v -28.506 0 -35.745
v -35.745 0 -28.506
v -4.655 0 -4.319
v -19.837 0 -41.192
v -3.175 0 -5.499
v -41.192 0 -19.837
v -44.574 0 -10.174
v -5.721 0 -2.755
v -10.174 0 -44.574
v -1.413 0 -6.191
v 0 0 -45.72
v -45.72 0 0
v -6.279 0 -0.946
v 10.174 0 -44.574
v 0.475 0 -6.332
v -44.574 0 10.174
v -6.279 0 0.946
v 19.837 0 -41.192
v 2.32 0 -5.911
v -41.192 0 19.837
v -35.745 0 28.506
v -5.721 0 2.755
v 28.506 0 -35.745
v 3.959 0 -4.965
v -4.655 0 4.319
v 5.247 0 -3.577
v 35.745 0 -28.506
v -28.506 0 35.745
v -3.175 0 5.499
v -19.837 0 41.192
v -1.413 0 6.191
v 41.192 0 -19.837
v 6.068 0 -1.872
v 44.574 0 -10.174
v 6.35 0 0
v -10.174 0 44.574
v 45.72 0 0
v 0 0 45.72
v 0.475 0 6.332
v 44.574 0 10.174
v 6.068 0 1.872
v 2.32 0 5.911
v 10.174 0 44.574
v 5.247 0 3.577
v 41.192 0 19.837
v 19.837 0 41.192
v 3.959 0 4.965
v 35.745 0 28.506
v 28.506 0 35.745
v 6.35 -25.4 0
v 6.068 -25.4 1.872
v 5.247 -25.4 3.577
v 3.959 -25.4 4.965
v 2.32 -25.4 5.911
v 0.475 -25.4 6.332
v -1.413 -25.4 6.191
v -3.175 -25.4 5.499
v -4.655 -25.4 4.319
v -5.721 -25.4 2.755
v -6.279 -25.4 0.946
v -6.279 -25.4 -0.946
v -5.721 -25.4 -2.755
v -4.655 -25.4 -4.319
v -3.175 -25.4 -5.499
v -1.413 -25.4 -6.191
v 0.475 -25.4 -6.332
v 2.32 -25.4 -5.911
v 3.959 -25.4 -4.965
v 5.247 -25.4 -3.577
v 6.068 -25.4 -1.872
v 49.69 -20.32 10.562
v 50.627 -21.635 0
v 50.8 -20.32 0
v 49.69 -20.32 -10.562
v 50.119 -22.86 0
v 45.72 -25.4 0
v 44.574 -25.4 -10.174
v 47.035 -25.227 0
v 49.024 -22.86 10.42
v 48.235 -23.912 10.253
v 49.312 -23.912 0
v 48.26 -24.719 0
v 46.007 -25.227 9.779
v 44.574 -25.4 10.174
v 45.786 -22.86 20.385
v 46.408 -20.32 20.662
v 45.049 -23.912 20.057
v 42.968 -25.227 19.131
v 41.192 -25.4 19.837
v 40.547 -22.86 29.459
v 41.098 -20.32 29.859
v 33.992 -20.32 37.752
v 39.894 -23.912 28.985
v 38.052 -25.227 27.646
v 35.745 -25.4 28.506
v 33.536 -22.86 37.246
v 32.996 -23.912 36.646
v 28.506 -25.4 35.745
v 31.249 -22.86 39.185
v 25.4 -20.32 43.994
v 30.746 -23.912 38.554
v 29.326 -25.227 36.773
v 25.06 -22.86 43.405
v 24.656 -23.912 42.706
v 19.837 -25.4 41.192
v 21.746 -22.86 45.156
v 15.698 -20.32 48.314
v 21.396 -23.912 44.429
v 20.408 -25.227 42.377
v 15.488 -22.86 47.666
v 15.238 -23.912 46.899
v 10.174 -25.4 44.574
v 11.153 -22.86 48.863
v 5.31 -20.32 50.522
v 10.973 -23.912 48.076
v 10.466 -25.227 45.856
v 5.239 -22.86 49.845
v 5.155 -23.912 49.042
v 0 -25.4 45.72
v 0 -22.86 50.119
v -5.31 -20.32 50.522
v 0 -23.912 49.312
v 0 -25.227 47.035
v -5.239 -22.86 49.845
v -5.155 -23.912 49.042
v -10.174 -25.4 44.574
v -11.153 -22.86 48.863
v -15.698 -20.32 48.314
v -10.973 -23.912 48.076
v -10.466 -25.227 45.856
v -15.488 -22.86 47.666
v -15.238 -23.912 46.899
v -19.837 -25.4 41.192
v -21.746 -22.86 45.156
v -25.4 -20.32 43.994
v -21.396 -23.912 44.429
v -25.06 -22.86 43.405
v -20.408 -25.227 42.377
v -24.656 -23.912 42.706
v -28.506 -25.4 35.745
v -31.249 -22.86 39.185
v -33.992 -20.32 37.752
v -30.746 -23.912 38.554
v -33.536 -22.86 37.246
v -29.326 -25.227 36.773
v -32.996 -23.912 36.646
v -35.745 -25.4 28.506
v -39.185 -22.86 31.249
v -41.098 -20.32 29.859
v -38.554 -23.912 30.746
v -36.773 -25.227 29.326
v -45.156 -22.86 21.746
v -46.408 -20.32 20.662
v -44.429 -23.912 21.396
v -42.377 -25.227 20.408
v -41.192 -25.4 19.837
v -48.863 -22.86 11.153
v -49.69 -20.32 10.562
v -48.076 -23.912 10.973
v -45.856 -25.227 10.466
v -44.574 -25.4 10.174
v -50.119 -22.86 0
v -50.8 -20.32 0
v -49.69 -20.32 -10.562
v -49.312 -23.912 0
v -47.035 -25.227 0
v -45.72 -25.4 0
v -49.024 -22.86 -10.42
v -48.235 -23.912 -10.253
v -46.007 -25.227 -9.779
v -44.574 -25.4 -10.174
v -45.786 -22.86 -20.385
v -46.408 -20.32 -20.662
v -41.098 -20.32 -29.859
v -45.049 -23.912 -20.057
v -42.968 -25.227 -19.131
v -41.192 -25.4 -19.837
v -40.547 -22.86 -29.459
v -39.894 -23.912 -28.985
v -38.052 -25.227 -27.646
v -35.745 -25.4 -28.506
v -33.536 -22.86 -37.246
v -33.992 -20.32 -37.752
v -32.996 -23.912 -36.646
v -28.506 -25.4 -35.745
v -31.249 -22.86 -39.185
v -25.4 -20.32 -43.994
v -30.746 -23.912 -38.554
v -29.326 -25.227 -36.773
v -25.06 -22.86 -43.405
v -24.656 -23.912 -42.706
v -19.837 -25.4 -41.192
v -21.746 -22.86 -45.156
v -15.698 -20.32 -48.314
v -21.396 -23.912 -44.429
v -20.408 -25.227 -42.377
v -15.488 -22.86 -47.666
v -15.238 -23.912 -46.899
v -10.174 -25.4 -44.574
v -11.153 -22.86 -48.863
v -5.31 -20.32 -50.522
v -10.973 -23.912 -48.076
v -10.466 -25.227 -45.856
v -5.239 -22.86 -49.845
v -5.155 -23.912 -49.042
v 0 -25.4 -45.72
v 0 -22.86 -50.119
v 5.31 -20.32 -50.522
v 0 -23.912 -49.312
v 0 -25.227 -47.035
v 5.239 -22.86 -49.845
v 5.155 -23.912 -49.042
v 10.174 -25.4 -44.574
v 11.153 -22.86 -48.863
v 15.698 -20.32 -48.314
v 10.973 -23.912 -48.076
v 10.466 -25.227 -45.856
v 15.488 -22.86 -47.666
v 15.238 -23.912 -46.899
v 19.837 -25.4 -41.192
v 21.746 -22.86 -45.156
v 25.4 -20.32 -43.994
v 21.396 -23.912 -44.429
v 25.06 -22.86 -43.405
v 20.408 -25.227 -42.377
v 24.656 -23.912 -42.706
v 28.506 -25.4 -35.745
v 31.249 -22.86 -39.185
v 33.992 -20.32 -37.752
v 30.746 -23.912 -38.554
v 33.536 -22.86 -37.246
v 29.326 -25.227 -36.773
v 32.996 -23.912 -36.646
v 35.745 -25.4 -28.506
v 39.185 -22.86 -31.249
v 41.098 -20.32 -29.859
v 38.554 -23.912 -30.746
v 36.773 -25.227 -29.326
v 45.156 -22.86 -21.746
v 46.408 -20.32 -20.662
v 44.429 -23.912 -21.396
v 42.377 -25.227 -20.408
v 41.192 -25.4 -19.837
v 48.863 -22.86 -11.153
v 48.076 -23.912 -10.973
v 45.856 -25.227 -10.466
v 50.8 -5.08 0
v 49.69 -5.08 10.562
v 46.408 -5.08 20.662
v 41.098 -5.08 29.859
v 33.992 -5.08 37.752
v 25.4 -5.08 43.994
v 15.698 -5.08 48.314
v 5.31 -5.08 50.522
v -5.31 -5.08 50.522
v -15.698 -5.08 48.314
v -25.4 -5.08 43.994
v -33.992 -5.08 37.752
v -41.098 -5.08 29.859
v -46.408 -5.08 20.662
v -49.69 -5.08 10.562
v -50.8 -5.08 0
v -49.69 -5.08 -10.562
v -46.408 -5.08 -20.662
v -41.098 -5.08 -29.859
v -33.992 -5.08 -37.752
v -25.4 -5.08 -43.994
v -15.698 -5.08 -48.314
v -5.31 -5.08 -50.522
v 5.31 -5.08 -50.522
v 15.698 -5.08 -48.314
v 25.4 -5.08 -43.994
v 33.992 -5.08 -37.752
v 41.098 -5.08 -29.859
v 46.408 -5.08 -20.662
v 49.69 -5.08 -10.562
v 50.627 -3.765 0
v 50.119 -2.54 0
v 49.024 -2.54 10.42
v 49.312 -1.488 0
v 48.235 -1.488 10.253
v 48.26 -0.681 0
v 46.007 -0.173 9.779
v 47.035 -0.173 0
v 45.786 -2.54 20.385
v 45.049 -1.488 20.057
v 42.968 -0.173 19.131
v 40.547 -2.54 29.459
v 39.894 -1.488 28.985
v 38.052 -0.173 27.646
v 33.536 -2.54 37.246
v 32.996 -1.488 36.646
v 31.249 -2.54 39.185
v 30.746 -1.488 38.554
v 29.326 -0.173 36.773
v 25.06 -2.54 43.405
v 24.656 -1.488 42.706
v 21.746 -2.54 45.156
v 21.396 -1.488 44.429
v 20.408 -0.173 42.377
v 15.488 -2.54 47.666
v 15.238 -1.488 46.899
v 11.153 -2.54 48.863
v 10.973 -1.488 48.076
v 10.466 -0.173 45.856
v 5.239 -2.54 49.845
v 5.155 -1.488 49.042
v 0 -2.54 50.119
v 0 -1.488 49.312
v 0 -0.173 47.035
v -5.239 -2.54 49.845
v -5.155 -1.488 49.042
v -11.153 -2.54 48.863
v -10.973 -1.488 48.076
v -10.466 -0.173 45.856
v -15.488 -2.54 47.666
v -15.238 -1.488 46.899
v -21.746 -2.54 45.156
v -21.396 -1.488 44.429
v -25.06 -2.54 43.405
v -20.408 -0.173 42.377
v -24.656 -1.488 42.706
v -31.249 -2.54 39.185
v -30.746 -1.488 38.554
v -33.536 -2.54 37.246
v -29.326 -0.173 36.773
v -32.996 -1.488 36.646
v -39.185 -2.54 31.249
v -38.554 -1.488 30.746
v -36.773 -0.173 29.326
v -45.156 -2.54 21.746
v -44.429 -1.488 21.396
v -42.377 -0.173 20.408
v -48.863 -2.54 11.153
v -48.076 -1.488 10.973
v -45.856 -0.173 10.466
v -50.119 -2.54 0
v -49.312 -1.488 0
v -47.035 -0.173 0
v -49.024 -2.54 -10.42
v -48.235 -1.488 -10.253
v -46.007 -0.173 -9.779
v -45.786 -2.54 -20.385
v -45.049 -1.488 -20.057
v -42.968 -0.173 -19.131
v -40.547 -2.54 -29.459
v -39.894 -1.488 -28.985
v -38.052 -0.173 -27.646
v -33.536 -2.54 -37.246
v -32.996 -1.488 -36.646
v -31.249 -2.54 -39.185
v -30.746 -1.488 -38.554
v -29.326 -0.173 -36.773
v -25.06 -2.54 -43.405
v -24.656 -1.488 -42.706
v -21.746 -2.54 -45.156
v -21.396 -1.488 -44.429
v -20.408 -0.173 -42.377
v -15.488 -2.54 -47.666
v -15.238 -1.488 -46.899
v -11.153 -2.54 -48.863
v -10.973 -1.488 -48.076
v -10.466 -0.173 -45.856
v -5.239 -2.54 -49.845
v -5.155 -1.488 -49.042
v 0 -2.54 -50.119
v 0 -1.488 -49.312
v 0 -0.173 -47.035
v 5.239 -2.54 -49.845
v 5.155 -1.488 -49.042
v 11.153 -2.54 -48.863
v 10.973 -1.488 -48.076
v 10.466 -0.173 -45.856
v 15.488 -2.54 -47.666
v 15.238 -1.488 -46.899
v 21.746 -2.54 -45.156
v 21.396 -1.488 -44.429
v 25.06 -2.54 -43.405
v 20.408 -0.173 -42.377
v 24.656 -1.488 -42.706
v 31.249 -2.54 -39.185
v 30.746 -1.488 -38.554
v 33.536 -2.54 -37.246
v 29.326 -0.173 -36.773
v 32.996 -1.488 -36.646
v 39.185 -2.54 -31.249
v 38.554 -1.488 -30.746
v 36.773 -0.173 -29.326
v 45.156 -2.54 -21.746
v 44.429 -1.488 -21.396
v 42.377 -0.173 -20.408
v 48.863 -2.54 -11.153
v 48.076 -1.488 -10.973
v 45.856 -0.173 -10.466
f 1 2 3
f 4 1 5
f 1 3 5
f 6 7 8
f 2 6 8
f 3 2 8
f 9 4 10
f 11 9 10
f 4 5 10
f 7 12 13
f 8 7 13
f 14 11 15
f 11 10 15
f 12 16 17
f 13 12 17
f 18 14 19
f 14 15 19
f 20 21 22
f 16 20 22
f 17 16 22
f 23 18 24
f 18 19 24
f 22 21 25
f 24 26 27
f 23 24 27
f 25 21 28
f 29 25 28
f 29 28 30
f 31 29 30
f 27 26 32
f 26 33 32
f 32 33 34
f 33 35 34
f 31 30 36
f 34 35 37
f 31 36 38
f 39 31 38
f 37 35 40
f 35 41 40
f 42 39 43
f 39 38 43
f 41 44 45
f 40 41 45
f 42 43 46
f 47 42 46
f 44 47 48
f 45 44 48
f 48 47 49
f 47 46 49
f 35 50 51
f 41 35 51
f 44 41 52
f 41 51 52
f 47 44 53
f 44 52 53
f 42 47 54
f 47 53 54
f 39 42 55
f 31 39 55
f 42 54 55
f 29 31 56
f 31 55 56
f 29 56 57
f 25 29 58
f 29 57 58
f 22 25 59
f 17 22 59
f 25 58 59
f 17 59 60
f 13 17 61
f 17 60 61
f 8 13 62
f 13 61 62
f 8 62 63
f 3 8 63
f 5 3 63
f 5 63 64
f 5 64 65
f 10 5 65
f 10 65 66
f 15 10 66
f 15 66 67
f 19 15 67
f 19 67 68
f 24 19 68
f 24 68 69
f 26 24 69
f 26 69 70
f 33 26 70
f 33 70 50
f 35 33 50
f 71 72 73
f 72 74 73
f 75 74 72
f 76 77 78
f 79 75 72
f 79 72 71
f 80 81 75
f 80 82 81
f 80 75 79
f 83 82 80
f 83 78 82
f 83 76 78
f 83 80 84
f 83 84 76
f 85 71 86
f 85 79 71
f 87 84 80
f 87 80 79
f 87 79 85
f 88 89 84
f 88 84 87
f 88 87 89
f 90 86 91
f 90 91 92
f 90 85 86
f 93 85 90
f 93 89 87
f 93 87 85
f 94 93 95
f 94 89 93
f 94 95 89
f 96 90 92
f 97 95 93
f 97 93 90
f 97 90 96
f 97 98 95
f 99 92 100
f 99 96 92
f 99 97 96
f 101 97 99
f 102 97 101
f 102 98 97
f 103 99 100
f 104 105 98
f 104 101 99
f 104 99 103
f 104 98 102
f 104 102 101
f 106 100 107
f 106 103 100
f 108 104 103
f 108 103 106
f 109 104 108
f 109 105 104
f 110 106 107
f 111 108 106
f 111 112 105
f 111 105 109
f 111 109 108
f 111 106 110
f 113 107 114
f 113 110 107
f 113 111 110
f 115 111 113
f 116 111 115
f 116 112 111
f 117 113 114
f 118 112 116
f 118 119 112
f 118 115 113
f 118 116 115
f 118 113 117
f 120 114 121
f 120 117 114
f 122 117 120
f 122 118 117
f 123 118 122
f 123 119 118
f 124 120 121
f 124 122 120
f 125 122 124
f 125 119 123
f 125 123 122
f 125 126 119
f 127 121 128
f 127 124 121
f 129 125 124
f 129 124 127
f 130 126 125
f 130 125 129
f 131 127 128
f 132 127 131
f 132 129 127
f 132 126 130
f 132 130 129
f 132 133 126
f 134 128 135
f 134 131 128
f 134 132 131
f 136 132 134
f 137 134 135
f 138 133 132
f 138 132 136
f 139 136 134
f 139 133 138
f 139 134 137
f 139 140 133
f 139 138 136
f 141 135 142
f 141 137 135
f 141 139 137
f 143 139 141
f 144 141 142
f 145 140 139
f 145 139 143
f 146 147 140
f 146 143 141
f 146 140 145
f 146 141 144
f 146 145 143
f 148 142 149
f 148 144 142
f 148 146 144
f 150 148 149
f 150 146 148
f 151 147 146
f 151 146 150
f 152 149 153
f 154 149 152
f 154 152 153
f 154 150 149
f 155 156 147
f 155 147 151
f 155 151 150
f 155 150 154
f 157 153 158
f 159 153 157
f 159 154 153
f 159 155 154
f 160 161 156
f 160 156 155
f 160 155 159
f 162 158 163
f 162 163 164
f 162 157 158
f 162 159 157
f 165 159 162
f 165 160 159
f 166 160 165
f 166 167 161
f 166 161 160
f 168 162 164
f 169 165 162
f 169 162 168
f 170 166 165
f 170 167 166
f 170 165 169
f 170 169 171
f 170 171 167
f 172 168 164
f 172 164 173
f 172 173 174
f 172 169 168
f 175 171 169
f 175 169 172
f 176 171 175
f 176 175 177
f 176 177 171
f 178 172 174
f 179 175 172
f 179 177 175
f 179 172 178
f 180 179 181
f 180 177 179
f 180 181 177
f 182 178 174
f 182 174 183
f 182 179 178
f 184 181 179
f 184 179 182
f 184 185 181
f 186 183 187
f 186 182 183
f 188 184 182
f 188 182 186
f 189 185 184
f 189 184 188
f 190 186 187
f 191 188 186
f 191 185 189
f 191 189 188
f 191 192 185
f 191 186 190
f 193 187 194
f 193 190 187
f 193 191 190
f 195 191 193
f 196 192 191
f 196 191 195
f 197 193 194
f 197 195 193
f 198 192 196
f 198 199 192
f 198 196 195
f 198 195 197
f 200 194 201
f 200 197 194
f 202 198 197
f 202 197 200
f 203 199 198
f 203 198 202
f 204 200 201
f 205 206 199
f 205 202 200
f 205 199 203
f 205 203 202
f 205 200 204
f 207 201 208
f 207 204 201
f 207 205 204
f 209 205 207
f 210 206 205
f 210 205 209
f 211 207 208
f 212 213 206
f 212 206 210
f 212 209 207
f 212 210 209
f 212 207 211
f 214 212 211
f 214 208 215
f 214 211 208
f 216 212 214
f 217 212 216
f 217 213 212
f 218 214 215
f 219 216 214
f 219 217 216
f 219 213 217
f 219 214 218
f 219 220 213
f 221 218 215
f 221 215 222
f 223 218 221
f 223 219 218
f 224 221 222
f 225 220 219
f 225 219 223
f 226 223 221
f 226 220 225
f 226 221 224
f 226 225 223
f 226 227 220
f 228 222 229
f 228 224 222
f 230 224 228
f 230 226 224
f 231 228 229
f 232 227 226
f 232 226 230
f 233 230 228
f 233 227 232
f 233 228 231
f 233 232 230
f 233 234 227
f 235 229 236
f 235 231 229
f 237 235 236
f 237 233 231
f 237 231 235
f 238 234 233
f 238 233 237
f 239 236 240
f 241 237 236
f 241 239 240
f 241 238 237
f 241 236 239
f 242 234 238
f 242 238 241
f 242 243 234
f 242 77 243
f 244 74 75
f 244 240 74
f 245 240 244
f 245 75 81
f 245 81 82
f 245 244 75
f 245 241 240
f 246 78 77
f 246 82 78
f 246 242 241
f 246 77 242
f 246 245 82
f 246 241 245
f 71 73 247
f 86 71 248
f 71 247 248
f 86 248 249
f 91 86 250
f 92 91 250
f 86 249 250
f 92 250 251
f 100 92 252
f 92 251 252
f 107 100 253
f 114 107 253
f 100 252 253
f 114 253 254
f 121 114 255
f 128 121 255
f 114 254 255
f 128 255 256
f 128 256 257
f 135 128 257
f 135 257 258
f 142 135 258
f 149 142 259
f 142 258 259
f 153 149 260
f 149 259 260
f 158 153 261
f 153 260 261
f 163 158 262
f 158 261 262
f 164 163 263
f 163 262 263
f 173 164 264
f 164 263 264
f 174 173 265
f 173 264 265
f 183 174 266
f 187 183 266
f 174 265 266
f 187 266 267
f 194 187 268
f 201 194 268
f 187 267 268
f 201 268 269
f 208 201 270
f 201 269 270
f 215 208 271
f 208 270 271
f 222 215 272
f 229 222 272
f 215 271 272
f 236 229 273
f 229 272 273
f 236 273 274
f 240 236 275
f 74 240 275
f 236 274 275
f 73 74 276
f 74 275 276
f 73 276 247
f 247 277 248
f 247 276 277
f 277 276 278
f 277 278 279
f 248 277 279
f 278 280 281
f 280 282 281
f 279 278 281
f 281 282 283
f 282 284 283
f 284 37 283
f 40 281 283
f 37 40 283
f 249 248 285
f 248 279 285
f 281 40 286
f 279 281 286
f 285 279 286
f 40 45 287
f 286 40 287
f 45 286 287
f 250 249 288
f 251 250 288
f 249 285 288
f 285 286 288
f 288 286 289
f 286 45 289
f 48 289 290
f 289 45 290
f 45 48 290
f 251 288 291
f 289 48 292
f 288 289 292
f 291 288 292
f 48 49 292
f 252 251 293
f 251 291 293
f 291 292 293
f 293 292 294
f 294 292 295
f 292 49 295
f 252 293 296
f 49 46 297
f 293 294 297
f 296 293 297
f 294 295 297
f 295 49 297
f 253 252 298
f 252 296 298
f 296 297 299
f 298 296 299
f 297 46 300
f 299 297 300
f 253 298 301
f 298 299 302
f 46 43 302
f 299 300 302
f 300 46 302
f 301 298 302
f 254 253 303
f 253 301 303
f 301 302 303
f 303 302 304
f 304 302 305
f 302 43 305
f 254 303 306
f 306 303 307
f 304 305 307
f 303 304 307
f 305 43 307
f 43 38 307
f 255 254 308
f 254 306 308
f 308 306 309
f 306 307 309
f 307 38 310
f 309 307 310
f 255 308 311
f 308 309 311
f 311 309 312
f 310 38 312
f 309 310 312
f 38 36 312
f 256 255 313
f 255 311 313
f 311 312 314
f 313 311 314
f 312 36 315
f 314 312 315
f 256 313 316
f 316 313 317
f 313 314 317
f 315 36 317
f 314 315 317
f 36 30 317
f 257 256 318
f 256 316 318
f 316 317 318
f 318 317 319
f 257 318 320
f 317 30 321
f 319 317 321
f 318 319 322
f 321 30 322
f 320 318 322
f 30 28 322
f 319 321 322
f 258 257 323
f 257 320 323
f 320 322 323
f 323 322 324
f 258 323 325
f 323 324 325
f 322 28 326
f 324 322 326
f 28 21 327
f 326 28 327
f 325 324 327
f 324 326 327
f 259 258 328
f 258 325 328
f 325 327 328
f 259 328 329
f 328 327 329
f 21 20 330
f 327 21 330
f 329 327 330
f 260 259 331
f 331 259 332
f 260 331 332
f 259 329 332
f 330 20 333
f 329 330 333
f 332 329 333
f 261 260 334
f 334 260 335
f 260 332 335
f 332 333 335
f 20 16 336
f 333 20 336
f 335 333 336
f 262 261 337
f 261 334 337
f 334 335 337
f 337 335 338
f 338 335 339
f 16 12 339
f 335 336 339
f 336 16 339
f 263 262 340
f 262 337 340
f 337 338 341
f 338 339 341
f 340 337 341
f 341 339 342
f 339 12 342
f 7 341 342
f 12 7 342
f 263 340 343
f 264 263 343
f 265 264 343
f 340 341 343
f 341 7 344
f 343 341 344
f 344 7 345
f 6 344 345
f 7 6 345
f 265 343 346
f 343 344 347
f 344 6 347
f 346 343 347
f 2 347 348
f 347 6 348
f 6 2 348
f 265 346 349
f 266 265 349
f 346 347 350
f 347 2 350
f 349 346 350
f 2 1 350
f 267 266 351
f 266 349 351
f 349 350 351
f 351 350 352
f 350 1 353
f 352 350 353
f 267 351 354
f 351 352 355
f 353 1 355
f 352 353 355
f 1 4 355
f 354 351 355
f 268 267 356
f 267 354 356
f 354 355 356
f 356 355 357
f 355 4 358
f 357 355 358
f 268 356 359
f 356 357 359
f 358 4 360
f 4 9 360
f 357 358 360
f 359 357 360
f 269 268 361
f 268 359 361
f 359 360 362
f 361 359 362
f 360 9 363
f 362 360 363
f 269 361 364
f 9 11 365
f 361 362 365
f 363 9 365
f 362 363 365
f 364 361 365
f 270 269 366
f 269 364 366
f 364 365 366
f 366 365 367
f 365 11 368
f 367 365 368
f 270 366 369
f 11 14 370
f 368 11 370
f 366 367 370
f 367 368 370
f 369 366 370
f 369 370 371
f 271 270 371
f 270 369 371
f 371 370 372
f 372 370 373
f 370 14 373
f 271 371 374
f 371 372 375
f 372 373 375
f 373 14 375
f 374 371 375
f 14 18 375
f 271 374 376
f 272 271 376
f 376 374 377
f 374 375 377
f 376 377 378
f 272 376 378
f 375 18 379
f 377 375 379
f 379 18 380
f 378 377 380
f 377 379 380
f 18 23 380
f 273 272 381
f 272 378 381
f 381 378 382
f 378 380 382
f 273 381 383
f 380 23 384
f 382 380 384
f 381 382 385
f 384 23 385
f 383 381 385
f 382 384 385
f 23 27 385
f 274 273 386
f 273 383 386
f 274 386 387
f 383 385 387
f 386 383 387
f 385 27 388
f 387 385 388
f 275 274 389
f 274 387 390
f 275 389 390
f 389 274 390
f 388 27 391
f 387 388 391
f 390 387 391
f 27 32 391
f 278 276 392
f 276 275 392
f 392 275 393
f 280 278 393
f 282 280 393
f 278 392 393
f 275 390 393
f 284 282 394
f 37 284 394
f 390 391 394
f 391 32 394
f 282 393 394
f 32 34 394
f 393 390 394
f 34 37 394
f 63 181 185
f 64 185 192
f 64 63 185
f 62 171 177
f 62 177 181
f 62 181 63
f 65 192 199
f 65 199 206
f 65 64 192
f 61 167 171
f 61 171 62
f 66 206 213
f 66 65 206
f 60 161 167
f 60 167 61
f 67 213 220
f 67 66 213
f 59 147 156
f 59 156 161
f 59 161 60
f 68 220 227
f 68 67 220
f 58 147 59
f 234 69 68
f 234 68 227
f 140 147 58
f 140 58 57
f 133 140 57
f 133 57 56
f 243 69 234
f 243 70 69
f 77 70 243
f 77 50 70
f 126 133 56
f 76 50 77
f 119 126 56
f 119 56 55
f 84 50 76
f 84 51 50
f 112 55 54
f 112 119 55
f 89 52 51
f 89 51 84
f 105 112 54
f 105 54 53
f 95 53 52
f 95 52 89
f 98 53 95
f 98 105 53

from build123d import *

# Parameters (mm, degrees)
F0_R     = 50.8
F1_DEPTH = 25.4
F2_R     = 5.08
F3_R     = 6.35
F4_DEPTH = 25.401


with BuildPart() as f1:
    # F0 (on Front) → F1 (new body)
    with BuildSketch(Plane.XZ):
        Circle(F0_R)
    extrude(amount=F1_DEPTH)

    # F2
    f2_edges = [f1.edges().sort_by_distance(p)[0] for p in [
        (-50.8, -25.4, 0),
        (-50.8, 0, 0),
    ]]
    fillet(f2_edges, radius=F2_R)

    # F3 (on face) → F4 (cut, through all)
    with BuildSketch(Plane.XZ.offset(25.4)):
        Circle(F3_R)
    extrude(amount=-F4_DEPTH, mode=Mode.SUBTRACT)


solid = f1.part
